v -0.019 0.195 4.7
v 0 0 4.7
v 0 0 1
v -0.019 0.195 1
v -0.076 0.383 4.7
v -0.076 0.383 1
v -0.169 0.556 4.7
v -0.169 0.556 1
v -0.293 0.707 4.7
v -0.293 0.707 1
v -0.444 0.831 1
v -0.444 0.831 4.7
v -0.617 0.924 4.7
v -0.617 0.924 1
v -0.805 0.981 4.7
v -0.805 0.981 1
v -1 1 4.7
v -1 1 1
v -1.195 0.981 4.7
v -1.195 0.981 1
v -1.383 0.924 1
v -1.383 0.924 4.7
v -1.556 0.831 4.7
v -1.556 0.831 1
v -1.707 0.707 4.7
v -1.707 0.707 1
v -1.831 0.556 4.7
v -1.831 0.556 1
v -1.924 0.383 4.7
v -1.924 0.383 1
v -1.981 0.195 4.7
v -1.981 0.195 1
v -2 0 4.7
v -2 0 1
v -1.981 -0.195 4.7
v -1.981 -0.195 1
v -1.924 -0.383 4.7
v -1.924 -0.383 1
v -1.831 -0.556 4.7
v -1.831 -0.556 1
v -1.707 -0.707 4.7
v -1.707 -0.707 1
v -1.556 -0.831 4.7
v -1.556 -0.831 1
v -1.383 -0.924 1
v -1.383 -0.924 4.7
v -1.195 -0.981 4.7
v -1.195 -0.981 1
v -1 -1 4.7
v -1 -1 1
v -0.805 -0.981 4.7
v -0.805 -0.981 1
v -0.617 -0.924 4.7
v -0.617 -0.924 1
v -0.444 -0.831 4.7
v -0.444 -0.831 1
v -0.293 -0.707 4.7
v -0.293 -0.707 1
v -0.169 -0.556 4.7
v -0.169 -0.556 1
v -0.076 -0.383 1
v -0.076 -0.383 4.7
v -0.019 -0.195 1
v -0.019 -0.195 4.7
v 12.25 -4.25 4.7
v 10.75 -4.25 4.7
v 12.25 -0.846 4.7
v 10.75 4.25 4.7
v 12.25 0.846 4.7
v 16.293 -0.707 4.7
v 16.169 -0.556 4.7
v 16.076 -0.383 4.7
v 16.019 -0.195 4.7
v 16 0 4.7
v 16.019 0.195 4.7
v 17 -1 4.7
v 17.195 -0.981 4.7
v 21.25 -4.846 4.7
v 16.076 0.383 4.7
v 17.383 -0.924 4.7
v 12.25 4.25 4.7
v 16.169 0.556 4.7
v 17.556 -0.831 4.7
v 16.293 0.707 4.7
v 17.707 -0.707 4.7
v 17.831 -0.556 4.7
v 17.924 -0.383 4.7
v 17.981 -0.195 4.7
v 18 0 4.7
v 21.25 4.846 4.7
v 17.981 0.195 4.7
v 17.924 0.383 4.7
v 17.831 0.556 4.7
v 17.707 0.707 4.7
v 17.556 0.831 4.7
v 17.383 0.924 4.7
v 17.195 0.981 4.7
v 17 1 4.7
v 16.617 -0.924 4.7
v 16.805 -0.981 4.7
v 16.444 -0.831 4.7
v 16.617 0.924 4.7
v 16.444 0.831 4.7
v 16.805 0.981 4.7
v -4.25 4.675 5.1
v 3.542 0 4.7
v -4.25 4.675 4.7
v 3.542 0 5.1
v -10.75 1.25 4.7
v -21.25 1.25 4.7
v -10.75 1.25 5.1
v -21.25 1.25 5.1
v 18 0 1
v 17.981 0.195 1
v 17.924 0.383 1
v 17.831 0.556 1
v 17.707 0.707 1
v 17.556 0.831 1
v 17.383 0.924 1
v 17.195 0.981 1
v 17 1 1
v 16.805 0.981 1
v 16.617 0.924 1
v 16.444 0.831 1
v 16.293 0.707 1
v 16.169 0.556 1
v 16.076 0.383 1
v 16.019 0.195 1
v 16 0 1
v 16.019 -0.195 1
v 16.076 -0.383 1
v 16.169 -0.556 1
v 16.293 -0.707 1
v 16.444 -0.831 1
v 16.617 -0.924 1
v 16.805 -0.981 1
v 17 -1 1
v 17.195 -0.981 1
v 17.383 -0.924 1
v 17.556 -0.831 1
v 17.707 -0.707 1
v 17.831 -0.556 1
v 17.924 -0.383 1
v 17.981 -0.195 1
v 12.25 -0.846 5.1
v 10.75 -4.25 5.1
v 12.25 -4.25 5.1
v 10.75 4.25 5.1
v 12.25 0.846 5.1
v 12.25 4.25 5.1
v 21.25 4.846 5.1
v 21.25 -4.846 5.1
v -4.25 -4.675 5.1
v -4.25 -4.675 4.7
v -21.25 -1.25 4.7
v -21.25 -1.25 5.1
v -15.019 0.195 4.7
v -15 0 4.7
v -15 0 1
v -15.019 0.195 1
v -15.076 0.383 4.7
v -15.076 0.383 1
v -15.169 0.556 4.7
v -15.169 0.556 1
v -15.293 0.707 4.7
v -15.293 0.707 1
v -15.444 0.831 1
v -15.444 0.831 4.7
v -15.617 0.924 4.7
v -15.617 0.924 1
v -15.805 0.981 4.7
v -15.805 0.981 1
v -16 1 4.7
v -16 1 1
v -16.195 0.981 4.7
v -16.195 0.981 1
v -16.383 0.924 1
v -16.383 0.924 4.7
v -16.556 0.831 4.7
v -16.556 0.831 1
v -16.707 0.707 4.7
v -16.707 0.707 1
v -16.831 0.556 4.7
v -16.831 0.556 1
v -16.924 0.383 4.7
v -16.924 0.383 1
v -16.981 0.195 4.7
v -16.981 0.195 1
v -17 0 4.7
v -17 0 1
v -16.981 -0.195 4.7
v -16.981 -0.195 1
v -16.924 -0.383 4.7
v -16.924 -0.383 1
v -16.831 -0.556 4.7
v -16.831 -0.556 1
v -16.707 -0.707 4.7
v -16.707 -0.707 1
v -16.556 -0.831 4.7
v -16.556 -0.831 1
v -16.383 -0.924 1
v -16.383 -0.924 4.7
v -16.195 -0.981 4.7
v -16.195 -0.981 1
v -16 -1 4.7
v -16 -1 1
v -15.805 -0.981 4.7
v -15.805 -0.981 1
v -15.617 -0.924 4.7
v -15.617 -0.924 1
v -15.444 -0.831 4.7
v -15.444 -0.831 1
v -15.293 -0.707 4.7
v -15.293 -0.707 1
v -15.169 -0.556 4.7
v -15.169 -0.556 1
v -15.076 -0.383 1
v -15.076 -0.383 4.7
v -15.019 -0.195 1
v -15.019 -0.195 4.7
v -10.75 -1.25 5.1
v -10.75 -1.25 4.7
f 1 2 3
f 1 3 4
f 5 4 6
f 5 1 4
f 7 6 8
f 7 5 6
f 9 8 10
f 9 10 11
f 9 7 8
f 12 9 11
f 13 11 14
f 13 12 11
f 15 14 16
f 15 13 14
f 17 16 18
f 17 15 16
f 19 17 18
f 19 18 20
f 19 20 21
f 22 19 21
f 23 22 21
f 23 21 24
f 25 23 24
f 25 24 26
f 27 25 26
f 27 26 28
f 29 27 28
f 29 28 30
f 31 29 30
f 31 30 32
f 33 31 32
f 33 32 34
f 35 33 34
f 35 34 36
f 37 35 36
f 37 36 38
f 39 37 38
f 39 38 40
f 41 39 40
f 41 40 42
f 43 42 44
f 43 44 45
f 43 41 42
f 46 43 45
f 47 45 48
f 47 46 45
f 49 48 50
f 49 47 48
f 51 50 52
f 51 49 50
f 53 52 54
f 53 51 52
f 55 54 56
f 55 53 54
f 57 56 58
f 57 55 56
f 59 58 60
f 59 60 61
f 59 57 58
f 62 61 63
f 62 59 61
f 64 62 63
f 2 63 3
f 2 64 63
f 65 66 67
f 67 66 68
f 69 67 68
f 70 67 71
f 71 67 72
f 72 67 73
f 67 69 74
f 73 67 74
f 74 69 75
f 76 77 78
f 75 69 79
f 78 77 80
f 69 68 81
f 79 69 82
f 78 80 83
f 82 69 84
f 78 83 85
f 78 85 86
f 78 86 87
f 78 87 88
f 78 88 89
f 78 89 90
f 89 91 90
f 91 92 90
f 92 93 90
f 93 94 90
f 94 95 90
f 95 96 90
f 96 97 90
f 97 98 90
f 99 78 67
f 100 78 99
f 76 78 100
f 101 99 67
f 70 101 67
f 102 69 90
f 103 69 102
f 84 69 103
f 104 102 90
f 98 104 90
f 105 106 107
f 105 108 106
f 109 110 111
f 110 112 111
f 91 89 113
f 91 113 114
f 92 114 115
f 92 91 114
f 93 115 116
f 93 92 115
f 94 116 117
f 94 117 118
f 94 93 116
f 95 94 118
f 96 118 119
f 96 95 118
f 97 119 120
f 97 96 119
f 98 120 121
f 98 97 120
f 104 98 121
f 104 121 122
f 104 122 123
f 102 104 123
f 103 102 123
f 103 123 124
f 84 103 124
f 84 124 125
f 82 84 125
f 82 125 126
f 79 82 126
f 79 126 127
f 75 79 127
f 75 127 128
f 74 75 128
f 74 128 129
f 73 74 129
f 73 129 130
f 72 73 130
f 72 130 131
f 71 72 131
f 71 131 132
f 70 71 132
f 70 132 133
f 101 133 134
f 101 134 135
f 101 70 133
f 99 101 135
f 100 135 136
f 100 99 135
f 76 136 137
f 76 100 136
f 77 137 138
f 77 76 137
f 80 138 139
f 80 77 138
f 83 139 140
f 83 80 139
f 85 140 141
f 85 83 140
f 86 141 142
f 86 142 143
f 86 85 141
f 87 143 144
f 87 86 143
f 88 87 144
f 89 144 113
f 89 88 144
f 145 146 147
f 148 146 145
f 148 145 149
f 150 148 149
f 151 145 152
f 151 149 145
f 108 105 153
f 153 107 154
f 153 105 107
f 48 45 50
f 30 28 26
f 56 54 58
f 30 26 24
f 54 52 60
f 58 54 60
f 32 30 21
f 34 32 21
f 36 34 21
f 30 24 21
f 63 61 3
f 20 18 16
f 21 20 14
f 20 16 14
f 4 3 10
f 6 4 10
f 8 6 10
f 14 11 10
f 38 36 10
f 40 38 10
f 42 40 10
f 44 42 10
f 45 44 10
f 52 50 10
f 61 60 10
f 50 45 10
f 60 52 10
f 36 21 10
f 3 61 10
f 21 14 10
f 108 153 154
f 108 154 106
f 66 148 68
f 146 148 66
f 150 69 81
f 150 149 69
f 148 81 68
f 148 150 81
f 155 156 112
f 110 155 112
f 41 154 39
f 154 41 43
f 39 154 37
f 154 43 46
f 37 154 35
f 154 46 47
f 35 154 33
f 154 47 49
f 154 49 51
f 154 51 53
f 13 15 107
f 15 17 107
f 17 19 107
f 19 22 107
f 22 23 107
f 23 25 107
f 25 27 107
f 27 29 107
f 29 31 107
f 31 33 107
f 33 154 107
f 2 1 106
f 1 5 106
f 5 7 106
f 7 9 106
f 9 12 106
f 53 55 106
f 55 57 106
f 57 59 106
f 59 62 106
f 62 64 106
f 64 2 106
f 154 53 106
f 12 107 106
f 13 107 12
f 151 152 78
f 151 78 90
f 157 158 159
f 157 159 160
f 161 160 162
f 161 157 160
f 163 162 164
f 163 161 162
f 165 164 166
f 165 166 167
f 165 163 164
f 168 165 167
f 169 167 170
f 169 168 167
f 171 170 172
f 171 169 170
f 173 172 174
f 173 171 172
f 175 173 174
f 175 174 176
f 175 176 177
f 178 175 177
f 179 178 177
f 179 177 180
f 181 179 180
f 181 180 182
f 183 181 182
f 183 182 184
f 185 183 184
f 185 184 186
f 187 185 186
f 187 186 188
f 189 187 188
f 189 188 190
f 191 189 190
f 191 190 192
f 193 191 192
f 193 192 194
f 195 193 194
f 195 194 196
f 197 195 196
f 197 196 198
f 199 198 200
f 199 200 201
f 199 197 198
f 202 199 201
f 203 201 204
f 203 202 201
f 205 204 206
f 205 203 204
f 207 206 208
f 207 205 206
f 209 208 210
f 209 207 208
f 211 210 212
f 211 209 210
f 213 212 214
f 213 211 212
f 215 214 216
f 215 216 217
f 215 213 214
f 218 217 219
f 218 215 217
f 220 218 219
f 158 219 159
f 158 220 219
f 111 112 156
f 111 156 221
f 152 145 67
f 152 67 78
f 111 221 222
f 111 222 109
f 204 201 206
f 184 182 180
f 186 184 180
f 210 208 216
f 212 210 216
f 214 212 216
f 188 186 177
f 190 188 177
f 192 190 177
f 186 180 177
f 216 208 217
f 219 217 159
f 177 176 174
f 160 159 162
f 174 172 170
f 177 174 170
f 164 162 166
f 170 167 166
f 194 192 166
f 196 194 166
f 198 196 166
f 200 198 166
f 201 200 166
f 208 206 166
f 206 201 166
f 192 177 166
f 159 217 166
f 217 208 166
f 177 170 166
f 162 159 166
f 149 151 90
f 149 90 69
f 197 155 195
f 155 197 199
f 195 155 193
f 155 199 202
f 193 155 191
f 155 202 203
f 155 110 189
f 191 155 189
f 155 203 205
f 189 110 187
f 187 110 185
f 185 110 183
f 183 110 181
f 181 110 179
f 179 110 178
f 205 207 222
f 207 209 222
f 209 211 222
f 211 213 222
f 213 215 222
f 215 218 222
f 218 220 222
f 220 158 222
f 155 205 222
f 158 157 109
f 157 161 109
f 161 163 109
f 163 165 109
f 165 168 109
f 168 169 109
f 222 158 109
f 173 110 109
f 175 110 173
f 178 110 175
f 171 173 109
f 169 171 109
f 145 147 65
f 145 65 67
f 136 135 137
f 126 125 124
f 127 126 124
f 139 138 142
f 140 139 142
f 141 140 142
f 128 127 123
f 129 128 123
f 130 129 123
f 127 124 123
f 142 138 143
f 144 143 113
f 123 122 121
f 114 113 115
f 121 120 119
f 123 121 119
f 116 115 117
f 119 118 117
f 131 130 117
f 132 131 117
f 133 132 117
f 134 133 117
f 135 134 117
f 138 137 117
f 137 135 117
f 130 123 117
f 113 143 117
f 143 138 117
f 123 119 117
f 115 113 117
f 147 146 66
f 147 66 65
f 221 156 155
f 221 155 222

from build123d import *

# Parameters (mm, degrees)
BOSS_EXTRUDE3_DEPTH        = 0.1
BOSS_EXTRUDE3_DEPTH_BACK   = 0.3
BOSS_EXTRUDE3_2_DEPTH      = 0.1
BOSS_EXTRUDE3_2_DEPTH_BACK = 0.3
SKETCH5_W                  = 10.5
SKETCH5_H                  = 2.5
BOSS_EXTRUDE3_3_DEPTH      = 0.1
BOSS_EXTRUDE3_3_DEPTH_BACK = 0.3
SKETCH6_R                  = 1
BOSS_EXTRUDE4_DEPTH        = 4


with BuildPart() as part:
    # Sketch5 → Boss-Extrude3 (new body, two sides)
    with BuildSketch(Plane.XY.offset(5)) as boss_extrude3_sk:
        Polygon((-4.25, 4.675357216), (-4.25, -4.675357216), (3.542262026, 0), align=None)
    extrude(amount=BOSS_EXTRUDE3_DEPTH)
    extrude(boss_extrude3_sk.sketch, amount=-BOSS_EXTRUDE3_DEPTH_BACK)



with BuildPart() as body_2:
    # Sketch5 → Boss-Extrude3 2 (new body, two sides)
    with BuildSketch(Plane.XY.offset(5)) as boss_extrude3_2_sk:
        Polygon((10.75, 4.25), (10.75, -4.25), (12.25, -4.25), (12.25, -0.845928517), (21.25, -4.845928517), (21.25, 4.845928517), (12.25, 0.845928517), (12.25, 4.25), align=None)
    extrude(amount=BOSS_EXTRUDE3_2_DEPTH)
    extrude(boss_extrude3_2_sk.sketch, amount=-BOSS_EXTRUDE3_2_DEPTH_BACK)


with BuildPart() as body_3:
    # Sketch5 → Boss-Extrude3 3 (new body, two sides)
    with BuildSketch(Plane.XY.offset(5)) as boss_extrude3_3_sk:
        with Locations((-16, 0)):
            Rectangle(SKETCH5_W, SKETCH5_H)
    extrude(amount=BOSS_EXTRUDE3_3_DEPTH)
    extrude(boss_extrude3_3_sk.sketch, amount=-BOSS_EXTRUDE3_3_DEPTH_BACK)


with BuildPart() as part_1:
    add(part.part)

    add(body_2.part)  # Boss-Extrude4 merges body 2

    add(body_3.part)  # Boss-Extrude4 merges body 3
    # Sketch6 → Boss-Extrude4 (add)
    with BuildSketch(Plane.XY.offset(5)):
        with Locations((-16, 0)):
            Circle(SKETCH6_R)
        with Locations((-1, 0)):
            Circle(SKETCH6_R)
        with Locations((17, 0)):
            Circle(SKETCH6_R)
    extrude(amount=-BOSS_EXTRUDE4_DEPTH)


solid = part_1.part
